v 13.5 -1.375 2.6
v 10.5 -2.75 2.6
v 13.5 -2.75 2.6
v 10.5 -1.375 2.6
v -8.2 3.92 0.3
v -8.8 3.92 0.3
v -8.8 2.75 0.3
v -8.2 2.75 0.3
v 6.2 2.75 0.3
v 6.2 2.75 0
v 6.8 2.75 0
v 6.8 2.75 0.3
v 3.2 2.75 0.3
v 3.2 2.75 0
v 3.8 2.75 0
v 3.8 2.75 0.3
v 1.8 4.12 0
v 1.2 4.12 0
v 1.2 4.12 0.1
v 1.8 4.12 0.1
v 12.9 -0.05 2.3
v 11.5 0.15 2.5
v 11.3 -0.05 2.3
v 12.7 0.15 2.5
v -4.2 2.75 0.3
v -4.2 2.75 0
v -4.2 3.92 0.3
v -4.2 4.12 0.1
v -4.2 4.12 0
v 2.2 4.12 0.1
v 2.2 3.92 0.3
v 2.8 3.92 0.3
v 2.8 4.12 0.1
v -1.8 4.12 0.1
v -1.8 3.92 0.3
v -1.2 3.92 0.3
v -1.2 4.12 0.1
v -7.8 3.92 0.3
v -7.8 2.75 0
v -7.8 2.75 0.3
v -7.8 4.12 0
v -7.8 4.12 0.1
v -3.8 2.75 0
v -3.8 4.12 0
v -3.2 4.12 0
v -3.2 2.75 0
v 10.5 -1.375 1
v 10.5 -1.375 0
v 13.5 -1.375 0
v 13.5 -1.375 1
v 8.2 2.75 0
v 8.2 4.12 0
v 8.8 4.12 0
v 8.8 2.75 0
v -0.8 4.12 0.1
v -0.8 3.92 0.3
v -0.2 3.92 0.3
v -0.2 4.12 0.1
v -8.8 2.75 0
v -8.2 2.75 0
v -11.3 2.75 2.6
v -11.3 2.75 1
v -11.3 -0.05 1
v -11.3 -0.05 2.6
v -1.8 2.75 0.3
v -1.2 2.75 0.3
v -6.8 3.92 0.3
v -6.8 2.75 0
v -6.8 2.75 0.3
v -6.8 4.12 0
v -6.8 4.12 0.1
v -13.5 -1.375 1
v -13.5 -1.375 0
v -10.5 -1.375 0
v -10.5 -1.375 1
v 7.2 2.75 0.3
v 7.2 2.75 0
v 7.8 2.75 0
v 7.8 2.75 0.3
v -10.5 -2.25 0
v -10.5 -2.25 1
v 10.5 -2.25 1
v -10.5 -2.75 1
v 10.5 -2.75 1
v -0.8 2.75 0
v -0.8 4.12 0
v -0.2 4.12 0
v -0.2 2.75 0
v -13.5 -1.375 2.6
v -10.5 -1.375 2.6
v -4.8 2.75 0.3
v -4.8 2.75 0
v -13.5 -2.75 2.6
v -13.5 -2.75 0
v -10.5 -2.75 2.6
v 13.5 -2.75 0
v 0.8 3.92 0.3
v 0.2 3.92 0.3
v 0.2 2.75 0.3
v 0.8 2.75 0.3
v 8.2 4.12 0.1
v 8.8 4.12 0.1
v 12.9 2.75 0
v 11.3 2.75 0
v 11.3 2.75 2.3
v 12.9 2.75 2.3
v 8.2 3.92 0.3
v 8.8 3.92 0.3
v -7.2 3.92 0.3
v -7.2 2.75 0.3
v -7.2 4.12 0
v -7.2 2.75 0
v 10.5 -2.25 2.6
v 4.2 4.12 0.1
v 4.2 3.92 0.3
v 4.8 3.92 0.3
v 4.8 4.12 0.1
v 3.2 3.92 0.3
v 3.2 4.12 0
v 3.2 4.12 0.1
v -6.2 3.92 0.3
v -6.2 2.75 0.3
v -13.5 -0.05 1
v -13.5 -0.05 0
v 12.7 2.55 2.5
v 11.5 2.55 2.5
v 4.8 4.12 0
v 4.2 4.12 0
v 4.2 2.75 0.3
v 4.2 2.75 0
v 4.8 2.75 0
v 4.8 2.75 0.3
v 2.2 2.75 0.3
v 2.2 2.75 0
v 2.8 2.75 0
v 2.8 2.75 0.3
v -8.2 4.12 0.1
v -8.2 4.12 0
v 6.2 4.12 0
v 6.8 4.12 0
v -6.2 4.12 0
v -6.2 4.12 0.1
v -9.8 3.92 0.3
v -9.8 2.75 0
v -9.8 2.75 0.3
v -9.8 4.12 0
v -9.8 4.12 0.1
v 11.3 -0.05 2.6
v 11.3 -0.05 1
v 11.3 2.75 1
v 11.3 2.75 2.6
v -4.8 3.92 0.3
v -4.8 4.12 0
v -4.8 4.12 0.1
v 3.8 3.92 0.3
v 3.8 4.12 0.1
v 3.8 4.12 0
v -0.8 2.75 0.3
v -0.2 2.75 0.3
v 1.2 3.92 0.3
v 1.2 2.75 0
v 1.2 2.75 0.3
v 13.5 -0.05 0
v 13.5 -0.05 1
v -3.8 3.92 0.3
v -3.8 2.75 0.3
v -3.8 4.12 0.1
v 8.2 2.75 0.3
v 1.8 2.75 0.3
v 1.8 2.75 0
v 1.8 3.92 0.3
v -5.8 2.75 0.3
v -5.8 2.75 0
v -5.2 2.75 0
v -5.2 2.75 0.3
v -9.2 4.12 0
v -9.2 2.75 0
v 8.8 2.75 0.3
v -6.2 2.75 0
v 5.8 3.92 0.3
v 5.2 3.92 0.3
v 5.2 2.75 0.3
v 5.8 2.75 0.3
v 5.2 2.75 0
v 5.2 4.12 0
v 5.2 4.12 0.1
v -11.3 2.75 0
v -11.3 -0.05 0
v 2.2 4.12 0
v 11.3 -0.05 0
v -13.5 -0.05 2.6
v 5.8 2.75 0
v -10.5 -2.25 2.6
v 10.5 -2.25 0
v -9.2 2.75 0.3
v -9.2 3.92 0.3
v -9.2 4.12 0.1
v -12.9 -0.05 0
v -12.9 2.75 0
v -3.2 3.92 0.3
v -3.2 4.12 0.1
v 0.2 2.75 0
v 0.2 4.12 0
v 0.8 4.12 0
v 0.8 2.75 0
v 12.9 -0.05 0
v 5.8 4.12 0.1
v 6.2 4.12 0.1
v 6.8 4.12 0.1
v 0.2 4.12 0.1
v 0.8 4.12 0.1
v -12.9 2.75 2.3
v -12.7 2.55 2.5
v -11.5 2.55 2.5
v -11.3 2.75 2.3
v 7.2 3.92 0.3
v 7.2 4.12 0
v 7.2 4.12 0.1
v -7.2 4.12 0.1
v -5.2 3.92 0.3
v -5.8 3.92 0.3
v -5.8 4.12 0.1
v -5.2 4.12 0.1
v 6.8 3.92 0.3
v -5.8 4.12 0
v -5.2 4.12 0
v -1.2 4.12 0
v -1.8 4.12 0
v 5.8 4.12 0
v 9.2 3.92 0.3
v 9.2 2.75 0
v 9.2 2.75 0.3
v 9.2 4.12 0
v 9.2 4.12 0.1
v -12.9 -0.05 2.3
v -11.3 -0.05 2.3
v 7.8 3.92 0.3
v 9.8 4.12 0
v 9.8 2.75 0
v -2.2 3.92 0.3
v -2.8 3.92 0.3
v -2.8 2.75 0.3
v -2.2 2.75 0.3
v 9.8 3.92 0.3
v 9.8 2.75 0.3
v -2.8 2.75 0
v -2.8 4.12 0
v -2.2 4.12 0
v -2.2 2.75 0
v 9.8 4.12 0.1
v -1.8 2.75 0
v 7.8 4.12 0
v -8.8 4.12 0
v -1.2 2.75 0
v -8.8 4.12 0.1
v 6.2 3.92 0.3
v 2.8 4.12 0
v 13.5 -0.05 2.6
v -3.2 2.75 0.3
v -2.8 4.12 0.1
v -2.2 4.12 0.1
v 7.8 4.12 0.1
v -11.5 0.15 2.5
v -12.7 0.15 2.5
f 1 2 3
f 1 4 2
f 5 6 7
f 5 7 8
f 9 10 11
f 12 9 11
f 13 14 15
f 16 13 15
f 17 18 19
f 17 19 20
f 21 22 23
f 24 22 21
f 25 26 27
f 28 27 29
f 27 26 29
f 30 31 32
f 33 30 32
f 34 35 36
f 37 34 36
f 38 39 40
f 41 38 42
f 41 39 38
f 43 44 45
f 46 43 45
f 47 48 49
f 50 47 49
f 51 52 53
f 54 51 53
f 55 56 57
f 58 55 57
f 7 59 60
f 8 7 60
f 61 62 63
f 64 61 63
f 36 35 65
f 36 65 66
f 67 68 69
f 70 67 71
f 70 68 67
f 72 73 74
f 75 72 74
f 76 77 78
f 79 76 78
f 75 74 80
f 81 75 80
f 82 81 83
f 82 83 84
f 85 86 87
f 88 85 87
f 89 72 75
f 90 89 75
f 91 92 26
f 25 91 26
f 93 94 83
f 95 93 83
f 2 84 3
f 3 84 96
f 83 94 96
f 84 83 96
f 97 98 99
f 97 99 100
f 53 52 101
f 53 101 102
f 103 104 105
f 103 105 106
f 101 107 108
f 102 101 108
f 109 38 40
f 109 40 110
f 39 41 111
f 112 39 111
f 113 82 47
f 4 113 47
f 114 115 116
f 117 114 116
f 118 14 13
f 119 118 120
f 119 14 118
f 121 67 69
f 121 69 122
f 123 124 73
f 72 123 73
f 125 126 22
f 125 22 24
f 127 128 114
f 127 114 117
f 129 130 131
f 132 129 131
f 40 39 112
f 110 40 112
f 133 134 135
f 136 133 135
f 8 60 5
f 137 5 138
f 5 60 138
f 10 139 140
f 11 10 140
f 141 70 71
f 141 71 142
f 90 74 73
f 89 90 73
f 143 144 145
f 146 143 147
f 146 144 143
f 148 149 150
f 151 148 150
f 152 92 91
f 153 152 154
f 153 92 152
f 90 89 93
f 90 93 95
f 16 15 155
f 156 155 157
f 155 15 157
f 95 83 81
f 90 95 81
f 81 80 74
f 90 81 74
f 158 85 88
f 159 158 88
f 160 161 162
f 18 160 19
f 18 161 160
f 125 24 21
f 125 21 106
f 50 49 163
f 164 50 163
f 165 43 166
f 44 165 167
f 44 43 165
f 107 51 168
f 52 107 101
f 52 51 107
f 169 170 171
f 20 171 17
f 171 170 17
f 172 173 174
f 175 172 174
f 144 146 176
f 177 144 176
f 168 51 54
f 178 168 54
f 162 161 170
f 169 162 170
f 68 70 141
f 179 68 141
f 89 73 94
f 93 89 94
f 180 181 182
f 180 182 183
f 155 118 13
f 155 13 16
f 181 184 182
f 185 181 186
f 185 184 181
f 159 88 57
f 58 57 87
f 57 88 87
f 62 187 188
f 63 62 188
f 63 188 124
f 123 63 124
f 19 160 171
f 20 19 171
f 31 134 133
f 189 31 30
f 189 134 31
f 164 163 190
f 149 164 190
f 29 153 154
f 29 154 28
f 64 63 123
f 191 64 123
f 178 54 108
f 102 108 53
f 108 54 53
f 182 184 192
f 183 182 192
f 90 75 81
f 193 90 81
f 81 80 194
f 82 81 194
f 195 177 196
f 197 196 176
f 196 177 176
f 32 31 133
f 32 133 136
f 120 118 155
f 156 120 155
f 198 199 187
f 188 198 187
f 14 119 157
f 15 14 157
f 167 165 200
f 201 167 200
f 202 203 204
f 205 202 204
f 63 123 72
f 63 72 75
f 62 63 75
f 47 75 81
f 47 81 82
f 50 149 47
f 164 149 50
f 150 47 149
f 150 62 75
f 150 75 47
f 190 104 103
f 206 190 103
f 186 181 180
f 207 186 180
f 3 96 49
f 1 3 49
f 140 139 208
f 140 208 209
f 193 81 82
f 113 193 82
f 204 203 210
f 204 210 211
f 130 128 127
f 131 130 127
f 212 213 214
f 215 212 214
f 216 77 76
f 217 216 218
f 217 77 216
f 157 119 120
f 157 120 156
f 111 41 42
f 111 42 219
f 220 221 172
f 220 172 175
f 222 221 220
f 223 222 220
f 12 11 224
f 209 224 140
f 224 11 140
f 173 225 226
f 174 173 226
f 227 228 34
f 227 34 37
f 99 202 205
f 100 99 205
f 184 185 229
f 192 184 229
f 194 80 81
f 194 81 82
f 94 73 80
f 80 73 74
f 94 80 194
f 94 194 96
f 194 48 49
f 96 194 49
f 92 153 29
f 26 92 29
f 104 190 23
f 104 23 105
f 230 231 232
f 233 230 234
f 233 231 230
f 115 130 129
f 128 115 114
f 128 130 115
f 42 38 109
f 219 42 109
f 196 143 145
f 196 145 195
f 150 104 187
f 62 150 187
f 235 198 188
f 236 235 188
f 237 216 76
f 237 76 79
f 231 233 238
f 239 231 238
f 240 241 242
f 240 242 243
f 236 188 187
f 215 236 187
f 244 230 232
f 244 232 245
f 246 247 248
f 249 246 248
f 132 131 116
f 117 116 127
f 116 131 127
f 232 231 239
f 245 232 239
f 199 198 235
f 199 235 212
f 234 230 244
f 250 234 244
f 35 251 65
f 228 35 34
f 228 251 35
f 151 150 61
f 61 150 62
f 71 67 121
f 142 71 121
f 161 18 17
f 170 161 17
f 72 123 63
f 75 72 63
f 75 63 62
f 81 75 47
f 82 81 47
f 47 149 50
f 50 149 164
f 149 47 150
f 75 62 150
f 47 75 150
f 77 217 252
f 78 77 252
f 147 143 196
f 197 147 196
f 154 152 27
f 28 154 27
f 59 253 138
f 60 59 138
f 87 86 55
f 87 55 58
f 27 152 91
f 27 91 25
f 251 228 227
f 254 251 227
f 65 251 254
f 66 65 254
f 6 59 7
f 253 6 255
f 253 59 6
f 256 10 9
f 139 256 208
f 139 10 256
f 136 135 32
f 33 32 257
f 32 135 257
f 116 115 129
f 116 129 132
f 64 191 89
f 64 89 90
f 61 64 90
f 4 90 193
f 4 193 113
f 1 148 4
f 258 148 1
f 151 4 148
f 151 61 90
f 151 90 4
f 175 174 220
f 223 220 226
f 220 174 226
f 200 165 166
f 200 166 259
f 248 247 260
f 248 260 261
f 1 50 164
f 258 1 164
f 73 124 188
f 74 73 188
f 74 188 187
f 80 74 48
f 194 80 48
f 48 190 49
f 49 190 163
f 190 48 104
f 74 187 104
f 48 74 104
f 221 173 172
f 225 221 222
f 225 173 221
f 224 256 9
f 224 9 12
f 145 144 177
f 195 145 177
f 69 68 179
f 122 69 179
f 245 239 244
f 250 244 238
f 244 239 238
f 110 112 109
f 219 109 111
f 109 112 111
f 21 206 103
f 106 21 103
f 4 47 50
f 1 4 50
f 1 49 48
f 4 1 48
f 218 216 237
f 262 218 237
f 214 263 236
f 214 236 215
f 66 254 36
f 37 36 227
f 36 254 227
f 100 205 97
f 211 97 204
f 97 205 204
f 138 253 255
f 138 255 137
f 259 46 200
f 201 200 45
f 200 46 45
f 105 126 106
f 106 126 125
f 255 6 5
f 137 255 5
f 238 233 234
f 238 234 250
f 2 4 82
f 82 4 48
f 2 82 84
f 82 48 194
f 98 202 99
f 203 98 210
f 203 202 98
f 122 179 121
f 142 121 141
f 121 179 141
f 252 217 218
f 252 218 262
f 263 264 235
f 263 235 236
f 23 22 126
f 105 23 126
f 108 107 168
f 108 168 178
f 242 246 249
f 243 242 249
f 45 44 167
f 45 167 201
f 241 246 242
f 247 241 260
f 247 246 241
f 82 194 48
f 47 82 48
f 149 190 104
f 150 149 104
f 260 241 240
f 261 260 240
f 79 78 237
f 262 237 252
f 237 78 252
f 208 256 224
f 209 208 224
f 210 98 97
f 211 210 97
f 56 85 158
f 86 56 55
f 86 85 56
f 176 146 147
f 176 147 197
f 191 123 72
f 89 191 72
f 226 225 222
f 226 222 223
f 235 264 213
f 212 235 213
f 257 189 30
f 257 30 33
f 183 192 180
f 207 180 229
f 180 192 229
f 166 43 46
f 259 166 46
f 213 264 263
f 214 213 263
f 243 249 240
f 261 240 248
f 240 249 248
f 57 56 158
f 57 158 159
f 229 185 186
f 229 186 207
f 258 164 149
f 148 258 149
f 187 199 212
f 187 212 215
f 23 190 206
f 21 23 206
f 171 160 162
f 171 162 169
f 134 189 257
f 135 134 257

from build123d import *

# Parameters (mm, degrees)
F1_DEPTH   = 1
F2_DEPTH   = 2.6
F0_W       = 21
F0_H       = 0.5
F3_DEPTH   = 1
F5_DEPTH   = 1.6
F0_W_2     = 1.6
F0_H_2     = 2.8
F6_DEPTH   = 2.5
F0_W_3     = 0.6
F0_H_3     = 1.37
F7_DEPTH   = 0.3
F8_SIZE    = 0.2
F8_2_SIZE  = 0.2
F8_3_SIZE  = 0.2
F8_4_SIZE  = 0.2
F8_5_SIZE  = 0.2
F8_6_SIZE  = 0.2
F8_7_SIZE  = 0.2
F8_8_SIZE  = 0.2
F8_9_SIZE  = 0.2
F8_10_SIZE = 0.2
F8_11_SIZE = 0.2
F8_12_SIZE = 0.2
F8_13_SIZE = 0.2
F8_14_SIZE = 0.2
F8_15_SIZE = 0.2
F8_16_SIZE = 0.2
F8_17_SIZE = 0.2
F8_18_SIZE = 0.2
F8_19_SIZE = 0.2
F8_20_SIZE = 0.2
F9_SIZE    = 0.2
F9_2_SIZE  = 0.2


with BuildPart() as f1:
    # F0 (on Top) → F1 (new body)
    with BuildSketch(Plane.XY):
        Polygon((-9.8, 2.75), (-11.3, 2.75), (-11.3, -0.05), (-12.9, -0.05), (-13.5, -0.05), (-13.5, -1.375), (-10.5, -1.375), (-10.5, -2.25), (10.5, -2.25), (10.5, -1.375), (13.5, -1.375), (13.5, -0.05), (12.9, -0.05), (11.3, -0.05), (11.3, 2.75), (9.8, 2.75), (9.2, 2.75), (8.8, 2.75), (8.2, 2.75), (7.8, 2.75), (7.2, 2.75), (6.8, 2.75), (6.2, 2.75), (5.8, 2.75), (5.2, 2.75), (4.8, 2.75), (4.2, 2.75), (3.8, 2.75), (3.2, 2.75), (2.8, 2.75), (2.2, 2.75), (1.8, 2.75), (1.2, 2.75), (0.8, 2.75), (0.2, 2.75), (-0.2, 2.75), (-0.8, 2.75), (-1.2, 2.75), (-1.8, 2.75), (-2.2, 2.75), (-2.8, 2.75), (-3.2, 2.75), (-3.8, 2.75), (-4.2, 2.75), (-4.8, 2.75), (-5.2, 2.75), (-5.8, 2.75), (-6.2, 2.75), (-6.8, 2.75), (-7.2, 2.75), (-7.8, 2.75), (-8.2, 2.75), (-8.8, 2.75), (-9.2, 2.75), align=None)
    extrude(amount=F1_DEPTH)


with BuildPart() as f2:
    # F0 (on Top) → F2 (new body)
    with BuildSketch(Plane.XY):
        Polygon((-10.5, -1.375), (-13.5, -1.375), (-13.5, -2.75), (-10.5, -2.75), (-10.5, -2.25), align=None)
    extrude(amount=F2_DEPTH)



with BuildPart() as f2b:
    # F0 (on Top) → F2, piece 2 (new body)
    with BuildSketch(Plane.XY):
        Polygon((10.5, -2.25), (10.5, -2.75), (13.5, -2.75), (13.5, -1.375), (10.5, -1.375), align=None)
    extrude(amount=F2_DEPTH)


with BuildPart() as f2_1:
    add(f2.part)

    add(f2b.part)  # F3 merges F2b
    # F0 (on Top) → F3 (join)
    with BuildSketch(Plane.XY):
        with Locations((0, -2.5)):
            Rectangle(F0_W, F0_H)
    extrude(amount=F3_DEPTH)


with BuildPart() as f5:
    # F5 (new): a face of the model
    f5_faces = [f1.part.faces().sort_by_distance(p)[0] for p in [
        (0, 0.2268042664, 1),
    ]]
    extrude(f5_faces, amount=F5_DEPTH)


with BuildPart() as f6:
    # F0 (on Top) → F6 (new body)
    with BuildSketch(Plane.XY):
        with Locations((-12.1, 1.35)):
            Rectangle(F0_W_2, F0_H_2)
    extrude(amount=F6_DEPTH)

    # F9
    f9_edges = [f6.edges().sort_by_distance(p)[0] for p in [
        (-12.1, 2.75, 2.5),
        (-12.9, 1.35, 2.5),
        (-11.3, 1.35, 2.5),
        (-12.1, -0.05, 2.5),
    ]]
    chamfer(f9_edges, length=F9_SIZE)


with BuildPart() as f6b:
    # F0 (on Top) → F6, piece 2 (new body)
    with BuildSketch(Plane.XY):
        with Locations((12.1, 1.35)):
            Rectangle(F0_W_2, F0_H_2)
    extrude(amount=F6_DEPTH)

    # F9#2
    f9_2_edges = [f6b.edges().sort_by_distance(p)[0] for p in [
        (12.1, 2.75, 2.5),
        (12.9, 1.35, 2.5),
        (11.3, 1.35, 2.5),
        (12.1, -0.05, 2.5),
    ]]
    chamfer(f9_2_edges, length=F9_2_SIZE)


with BuildPart() as f7:
    # F0 (on Top) → F7 (new body)
    with BuildSketch(Plane.XY):
        with Locations((-9.5, 3.435)):
            Rectangle(F0_W_3, F0_H_3)
    extrude(amount=F7_DEPTH)

    # F8
    f8_edges = [f7.edges().sort_by_distance(p)[0] for p in [
        (-9.5, 4.12, 0.3),
    ]]
    chamfer(f8_edges, length=F8_SIZE)


with BuildPart() as f7b:
    # F0 (on Top) → F7, piece 2 (new body)
    with BuildSketch(Plane.XY):
        with Locations((-8.5, 3.435)):
            Rectangle(F0_W_3, F0_H_3)
    extrude(amount=F7_DEPTH)

    # F8#2
    f8_2_edges = [f7b.edges().sort_by_distance(p)[0] for p in [
        (-8.5, 4.12, 0.3),
    ]]
    chamfer(f8_2_edges, length=F8_2_SIZE)


with BuildPart() as f7c:
    # F0 (on Top) → F7, piece 3 (new body)
    with BuildSketch(Plane.XY):
        with Locations((-7.5, 3.435)):
            Rectangle(F0_W_3, F0_H_3)
    extrude(amount=F7_DEPTH)

    # F8#3
    f8_3_edges = [f7c.edges().sort_by_distance(p)[0] for p in [
        (-7.5, 4.12, 0.3),
    ]]
    chamfer(f8_3_edges, length=F8_3_SIZE)


with BuildPart() as f7d:
    # F0 (on Top) → F7, piece 4 (new body)
    with BuildSketch(Plane.XY):
        with Locations((-6.5, 3.435)):
            Rectangle(F0_W_3, F0_H_3)
    extrude(amount=F7_DEPTH)

    # F8#4
    f8_4_edges = [f7d.edges().sort_by_distance(p)[0] for p in [
        (-6.5, 4.12, 0.3),
    ]]
    chamfer(f8_4_edges, length=F8_4_SIZE)


with BuildPart() as f7e:
    # F0 (on Top) → F7, piece 5 (new body)
    with BuildSketch(Plane.XY):
        with Locations((-5.5, 3.435)):
            Rectangle(F0_W_3, F0_H_3)
    extrude(amount=F7_DEPTH)

    # F8#5
    f8_5_edges = [f7e.edges().sort_by_distance(p)[0] for p in [
        (-5.5, 4.12, 0.3),
    ]]
    chamfer(f8_5_edges, length=F8_5_SIZE)


with BuildPart() as f7f:
    # F0 (on Top) → F7, piece 6 (new body)
    with BuildSketch(Plane.XY):
        with Locations((-4.5, 3.435)):
            Rectangle(F0_W_3, F0_H_3)
    extrude(amount=F7_DEPTH)

    # F8#6
    f8_6_edges = [f7f.edges().sort_by_distance(p)[0] for p in [
        (-4.5, 4.12, 0.3),
    ]]
    chamfer(f8_6_edges, length=F8_6_SIZE)


with BuildPart() as f7g:
    # F0 (on Top) → F7, piece 7 (new body)
    with BuildSketch(Plane.XY):
        with Locations((-3.5, 3.435)):
            Rectangle(F0_W_3, F0_H_3)
    extrude(amount=F7_DEPTH)

    # F8#7
    f8_7_edges = [f7g.edges().sort_by_distance(p)[0] for p in [
        (-3.5, 4.12, 0.3),
    ]]
    chamfer(f8_7_edges, length=F8_7_SIZE)


with BuildPart() as f7h:
    # F0 (on Top) → F7, piece 8 (new body)
    with BuildSketch(Plane.XY):
        with Locations((-2.5, 3.435)):
            Rectangle(F0_W_3, F0_H_3)
    extrude(amount=F7_DEPTH)

    # F8#8
    f8_8_edges = [f7h.edges().sort_by_distance(p)[0] for p in [
        (-2.5, 4.12, 0.3),
    ]]
    chamfer(f8_8_edges, length=F8_8_SIZE)


with BuildPart() as f7i:
    # F0 (on Top) → F7, piece 9 (new body)
    with BuildSketch(Plane.XY):
        with Locations((-1.5, 3.435)):
            Rectangle(F0_W_3, F0_H_3)
    extrude(amount=F7_DEPTH)

    # F8#9
    f8_9_edges = [f7i.edges().sort_by_distance(p)[0] for p in [
        (-1.5, 4.12, 0.3),
    ]]
    chamfer(f8_9_edges, length=F8_9_SIZE)


with BuildPart() as f7j:
    # F0 (on Top) → F7, piece 10 (new body)
    with BuildSketch(Plane.XY):
        with Locations((-0.5, 3.435)):
            Rectangle(F0_W_3, F0_H_3)
    extrude(amount=F7_DEPTH)

    # F8#10
    f8_10_edges = [f7j.edges().sort_by_distance(p)[0] for p in [
        (-0.5, 4.12, 0.3),
    ]]
    chamfer(f8_10_edges, length=F8_10_SIZE)


with BuildPart() as f7k:
    # F0 (on Top) → F7, piece 11 (new body)
    with BuildSketch(Plane.XY):
        with Locations((0.5, 3.435)):
            Rectangle(F0_W_3, F0_H_3)
    extrude(amount=F7_DEPTH)

    # F8#11
    f8_11_edges = [f7k.edges().sort_by_distance(p)[0] for p in [
        (0.5, 4.12, 0.3),
    ]]
    chamfer(f8_11_edges, length=F8_11_SIZE)


with BuildPart() as f7l:
    # F0 (on Top) → F7, piece 12 (new body)
    with BuildSketch(Plane.XY):
        with Locations((1.5, 3.435)):
            Rectangle(F0_W_3, F0_H_3)
    extrude(amount=F7_DEPTH)

    # F8#12
    f8_12_edges = [f7l.edges().sort_by_distance(p)[0] for p in [
        (1.5, 4.12, 0.3),
    ]]
    chamfer(f8_12_edges, length=F8_12_SIZE)


with BuildPart() as f7m:
    # F0 (on Top) → F7, piece 13 (new body)
    with BuildSketch(Plane.XY):
        with Locations((2.5, 3.435)):
            Rectangle(F0_W_3, F0_H_3)
    extrude(amount=F7_DEPTH)

    # F8#13
    f8_13_edges = [f7m.edges().sort_by_distance(p)[0] for p in [
        (2.5, 4.12, 0.3),
    ]]
    chamfer(f8_13_edges, length=F8_13_SIZE)


with BuildPart() as f7n:
    # F0 (on Top) → F7, piece 14 (new body)
    with BuildSketch(Plane.XY):
        with Locations((3.5, 3.435)):
            Rectangle(F0_W_3, F0_H_3)
    extrude(amount=F7_DEPTH)

    # F8#14
    f8_14_edges = [f7n.edges().sort_by_distance(p)[0] for p in [
        (3.5, 4.12, 0.3),
    ]]
    chamfer(f8_14_edges, length=F8_14_SIZE)


with BuildPart() as f7o:
    # F0 (on Top) → F7, piece 15 (new body)
    with BuildSketch(Plane.XY):
        with Locations((4.5, 3.435)):
            Rectangle(F0_W_3, F0_H_3)
    extrude(amount=F7_DEPTH)

    # F8#15
    f8_15_edges = [f7o.edges().sort_by_distance(p)[0] for p in [
        (4.5, 4.12, 0.3),
    ]]
    chamfer(f8_15_edges, length=F8_15_SIZE)


with BuildPart() as f7p:
    # F0 (on Top) → F7, piece 16 (new body)
    with BuildSketch(Plane.XY):
        with Locations((5.5, 3.435)):
            Rectangle(F0_W_3, F0_H_3)
    extrude(amount=F7_DEPTH)

    # F8#16
    f8_16_edges = [f7p.edges().sort_by_distance(p)[0] for p in [
        (5.5, 4.12, 0.3),
    ]]
    chamfer(f8_16_edges, length=F8_16_SIZE)


with BuildPart() as f7q:
    # F0 (on Top) → F7, piece 17 (new body)
    with BuildSketch(Plane.XY):
        with Locations((6.5, 3.435)):
            Rectangle(F0_W_3, F0_H_3)
    extrude(amount=F7_DEPTH)

    # F8#17
    f8_17_edges = [f7q.edges().sort_by_distance(p)[0] for p in [
        (6.5, 4.12, 0.3),
    ]]
    chamfer(f8_17_edges, length=F8_17_SIZE)


with BuildPart() as f7r:
    # F0 (on Top) → F7, piece 18 (new body)
    with BuildSketch(Plane.XY):
        with Locations((7.5, 3.435)):
            Rectangle(F0_W_3, F0_H_3)
    extrude(amount=F7_DEPTH)

    # F8#18
    f8_18_edges = [f7r.edges().sort_by_distance(p)[0] for p in [
        (7.5, 4.12, 0.3),
    ]]
    chamfer(f8_18_edges, length=F8_18_SIZE)


with BuildPart() as f7s:
    # F0 (on Top) → F7, piece 19 (new body)
    with BuildSketch(Plane.XY):
        with Locations((8.5, 3.435)):
            Rectangle(F0_W_3, F0_H_3)
    extrude(amount=F7_DEPTH)

    # F8#19
    f8_19_edges = [f7s.edges().sort_by_distance(p)[0] for p in [
        (8.5, 4.12, 0.3),
    ]]
    chamfer(f8_19_edges, length=F8_19_SIZE)


with BuildPart() as f7t:
    # F0 (on Top) → F7, piece 20 (new body)
    with BuildSketch(Plane.XY):
        with Locations((9.5, 3.435)):
            Rectangle(F0_W_3, F0_H_3)
    extrude(amount=F7_DEPTH)

    # F8#20
    f8_20_edges = [f7t.edges().sort_by_distance(p)[0] for p in [
        (9.5, 4.12, 0.3),
    ]]
    chamfer(f8_20_edges, length=F8_20_SIZE)


solid = Compound([f1.part, f2_1.part, f5.part, f6.part, f6b.part, f7.part, f7b.part, f7c.part, f7d.part, f7e.part, f7f.part, f7g.part, f7h.part, f7i.part, f7j.part, f7k.part, f7l.part, f7m.part, f7n.part, f7o.part, f7p.part, f7q.part, f7r.part, f7s.part, f7t.part])
